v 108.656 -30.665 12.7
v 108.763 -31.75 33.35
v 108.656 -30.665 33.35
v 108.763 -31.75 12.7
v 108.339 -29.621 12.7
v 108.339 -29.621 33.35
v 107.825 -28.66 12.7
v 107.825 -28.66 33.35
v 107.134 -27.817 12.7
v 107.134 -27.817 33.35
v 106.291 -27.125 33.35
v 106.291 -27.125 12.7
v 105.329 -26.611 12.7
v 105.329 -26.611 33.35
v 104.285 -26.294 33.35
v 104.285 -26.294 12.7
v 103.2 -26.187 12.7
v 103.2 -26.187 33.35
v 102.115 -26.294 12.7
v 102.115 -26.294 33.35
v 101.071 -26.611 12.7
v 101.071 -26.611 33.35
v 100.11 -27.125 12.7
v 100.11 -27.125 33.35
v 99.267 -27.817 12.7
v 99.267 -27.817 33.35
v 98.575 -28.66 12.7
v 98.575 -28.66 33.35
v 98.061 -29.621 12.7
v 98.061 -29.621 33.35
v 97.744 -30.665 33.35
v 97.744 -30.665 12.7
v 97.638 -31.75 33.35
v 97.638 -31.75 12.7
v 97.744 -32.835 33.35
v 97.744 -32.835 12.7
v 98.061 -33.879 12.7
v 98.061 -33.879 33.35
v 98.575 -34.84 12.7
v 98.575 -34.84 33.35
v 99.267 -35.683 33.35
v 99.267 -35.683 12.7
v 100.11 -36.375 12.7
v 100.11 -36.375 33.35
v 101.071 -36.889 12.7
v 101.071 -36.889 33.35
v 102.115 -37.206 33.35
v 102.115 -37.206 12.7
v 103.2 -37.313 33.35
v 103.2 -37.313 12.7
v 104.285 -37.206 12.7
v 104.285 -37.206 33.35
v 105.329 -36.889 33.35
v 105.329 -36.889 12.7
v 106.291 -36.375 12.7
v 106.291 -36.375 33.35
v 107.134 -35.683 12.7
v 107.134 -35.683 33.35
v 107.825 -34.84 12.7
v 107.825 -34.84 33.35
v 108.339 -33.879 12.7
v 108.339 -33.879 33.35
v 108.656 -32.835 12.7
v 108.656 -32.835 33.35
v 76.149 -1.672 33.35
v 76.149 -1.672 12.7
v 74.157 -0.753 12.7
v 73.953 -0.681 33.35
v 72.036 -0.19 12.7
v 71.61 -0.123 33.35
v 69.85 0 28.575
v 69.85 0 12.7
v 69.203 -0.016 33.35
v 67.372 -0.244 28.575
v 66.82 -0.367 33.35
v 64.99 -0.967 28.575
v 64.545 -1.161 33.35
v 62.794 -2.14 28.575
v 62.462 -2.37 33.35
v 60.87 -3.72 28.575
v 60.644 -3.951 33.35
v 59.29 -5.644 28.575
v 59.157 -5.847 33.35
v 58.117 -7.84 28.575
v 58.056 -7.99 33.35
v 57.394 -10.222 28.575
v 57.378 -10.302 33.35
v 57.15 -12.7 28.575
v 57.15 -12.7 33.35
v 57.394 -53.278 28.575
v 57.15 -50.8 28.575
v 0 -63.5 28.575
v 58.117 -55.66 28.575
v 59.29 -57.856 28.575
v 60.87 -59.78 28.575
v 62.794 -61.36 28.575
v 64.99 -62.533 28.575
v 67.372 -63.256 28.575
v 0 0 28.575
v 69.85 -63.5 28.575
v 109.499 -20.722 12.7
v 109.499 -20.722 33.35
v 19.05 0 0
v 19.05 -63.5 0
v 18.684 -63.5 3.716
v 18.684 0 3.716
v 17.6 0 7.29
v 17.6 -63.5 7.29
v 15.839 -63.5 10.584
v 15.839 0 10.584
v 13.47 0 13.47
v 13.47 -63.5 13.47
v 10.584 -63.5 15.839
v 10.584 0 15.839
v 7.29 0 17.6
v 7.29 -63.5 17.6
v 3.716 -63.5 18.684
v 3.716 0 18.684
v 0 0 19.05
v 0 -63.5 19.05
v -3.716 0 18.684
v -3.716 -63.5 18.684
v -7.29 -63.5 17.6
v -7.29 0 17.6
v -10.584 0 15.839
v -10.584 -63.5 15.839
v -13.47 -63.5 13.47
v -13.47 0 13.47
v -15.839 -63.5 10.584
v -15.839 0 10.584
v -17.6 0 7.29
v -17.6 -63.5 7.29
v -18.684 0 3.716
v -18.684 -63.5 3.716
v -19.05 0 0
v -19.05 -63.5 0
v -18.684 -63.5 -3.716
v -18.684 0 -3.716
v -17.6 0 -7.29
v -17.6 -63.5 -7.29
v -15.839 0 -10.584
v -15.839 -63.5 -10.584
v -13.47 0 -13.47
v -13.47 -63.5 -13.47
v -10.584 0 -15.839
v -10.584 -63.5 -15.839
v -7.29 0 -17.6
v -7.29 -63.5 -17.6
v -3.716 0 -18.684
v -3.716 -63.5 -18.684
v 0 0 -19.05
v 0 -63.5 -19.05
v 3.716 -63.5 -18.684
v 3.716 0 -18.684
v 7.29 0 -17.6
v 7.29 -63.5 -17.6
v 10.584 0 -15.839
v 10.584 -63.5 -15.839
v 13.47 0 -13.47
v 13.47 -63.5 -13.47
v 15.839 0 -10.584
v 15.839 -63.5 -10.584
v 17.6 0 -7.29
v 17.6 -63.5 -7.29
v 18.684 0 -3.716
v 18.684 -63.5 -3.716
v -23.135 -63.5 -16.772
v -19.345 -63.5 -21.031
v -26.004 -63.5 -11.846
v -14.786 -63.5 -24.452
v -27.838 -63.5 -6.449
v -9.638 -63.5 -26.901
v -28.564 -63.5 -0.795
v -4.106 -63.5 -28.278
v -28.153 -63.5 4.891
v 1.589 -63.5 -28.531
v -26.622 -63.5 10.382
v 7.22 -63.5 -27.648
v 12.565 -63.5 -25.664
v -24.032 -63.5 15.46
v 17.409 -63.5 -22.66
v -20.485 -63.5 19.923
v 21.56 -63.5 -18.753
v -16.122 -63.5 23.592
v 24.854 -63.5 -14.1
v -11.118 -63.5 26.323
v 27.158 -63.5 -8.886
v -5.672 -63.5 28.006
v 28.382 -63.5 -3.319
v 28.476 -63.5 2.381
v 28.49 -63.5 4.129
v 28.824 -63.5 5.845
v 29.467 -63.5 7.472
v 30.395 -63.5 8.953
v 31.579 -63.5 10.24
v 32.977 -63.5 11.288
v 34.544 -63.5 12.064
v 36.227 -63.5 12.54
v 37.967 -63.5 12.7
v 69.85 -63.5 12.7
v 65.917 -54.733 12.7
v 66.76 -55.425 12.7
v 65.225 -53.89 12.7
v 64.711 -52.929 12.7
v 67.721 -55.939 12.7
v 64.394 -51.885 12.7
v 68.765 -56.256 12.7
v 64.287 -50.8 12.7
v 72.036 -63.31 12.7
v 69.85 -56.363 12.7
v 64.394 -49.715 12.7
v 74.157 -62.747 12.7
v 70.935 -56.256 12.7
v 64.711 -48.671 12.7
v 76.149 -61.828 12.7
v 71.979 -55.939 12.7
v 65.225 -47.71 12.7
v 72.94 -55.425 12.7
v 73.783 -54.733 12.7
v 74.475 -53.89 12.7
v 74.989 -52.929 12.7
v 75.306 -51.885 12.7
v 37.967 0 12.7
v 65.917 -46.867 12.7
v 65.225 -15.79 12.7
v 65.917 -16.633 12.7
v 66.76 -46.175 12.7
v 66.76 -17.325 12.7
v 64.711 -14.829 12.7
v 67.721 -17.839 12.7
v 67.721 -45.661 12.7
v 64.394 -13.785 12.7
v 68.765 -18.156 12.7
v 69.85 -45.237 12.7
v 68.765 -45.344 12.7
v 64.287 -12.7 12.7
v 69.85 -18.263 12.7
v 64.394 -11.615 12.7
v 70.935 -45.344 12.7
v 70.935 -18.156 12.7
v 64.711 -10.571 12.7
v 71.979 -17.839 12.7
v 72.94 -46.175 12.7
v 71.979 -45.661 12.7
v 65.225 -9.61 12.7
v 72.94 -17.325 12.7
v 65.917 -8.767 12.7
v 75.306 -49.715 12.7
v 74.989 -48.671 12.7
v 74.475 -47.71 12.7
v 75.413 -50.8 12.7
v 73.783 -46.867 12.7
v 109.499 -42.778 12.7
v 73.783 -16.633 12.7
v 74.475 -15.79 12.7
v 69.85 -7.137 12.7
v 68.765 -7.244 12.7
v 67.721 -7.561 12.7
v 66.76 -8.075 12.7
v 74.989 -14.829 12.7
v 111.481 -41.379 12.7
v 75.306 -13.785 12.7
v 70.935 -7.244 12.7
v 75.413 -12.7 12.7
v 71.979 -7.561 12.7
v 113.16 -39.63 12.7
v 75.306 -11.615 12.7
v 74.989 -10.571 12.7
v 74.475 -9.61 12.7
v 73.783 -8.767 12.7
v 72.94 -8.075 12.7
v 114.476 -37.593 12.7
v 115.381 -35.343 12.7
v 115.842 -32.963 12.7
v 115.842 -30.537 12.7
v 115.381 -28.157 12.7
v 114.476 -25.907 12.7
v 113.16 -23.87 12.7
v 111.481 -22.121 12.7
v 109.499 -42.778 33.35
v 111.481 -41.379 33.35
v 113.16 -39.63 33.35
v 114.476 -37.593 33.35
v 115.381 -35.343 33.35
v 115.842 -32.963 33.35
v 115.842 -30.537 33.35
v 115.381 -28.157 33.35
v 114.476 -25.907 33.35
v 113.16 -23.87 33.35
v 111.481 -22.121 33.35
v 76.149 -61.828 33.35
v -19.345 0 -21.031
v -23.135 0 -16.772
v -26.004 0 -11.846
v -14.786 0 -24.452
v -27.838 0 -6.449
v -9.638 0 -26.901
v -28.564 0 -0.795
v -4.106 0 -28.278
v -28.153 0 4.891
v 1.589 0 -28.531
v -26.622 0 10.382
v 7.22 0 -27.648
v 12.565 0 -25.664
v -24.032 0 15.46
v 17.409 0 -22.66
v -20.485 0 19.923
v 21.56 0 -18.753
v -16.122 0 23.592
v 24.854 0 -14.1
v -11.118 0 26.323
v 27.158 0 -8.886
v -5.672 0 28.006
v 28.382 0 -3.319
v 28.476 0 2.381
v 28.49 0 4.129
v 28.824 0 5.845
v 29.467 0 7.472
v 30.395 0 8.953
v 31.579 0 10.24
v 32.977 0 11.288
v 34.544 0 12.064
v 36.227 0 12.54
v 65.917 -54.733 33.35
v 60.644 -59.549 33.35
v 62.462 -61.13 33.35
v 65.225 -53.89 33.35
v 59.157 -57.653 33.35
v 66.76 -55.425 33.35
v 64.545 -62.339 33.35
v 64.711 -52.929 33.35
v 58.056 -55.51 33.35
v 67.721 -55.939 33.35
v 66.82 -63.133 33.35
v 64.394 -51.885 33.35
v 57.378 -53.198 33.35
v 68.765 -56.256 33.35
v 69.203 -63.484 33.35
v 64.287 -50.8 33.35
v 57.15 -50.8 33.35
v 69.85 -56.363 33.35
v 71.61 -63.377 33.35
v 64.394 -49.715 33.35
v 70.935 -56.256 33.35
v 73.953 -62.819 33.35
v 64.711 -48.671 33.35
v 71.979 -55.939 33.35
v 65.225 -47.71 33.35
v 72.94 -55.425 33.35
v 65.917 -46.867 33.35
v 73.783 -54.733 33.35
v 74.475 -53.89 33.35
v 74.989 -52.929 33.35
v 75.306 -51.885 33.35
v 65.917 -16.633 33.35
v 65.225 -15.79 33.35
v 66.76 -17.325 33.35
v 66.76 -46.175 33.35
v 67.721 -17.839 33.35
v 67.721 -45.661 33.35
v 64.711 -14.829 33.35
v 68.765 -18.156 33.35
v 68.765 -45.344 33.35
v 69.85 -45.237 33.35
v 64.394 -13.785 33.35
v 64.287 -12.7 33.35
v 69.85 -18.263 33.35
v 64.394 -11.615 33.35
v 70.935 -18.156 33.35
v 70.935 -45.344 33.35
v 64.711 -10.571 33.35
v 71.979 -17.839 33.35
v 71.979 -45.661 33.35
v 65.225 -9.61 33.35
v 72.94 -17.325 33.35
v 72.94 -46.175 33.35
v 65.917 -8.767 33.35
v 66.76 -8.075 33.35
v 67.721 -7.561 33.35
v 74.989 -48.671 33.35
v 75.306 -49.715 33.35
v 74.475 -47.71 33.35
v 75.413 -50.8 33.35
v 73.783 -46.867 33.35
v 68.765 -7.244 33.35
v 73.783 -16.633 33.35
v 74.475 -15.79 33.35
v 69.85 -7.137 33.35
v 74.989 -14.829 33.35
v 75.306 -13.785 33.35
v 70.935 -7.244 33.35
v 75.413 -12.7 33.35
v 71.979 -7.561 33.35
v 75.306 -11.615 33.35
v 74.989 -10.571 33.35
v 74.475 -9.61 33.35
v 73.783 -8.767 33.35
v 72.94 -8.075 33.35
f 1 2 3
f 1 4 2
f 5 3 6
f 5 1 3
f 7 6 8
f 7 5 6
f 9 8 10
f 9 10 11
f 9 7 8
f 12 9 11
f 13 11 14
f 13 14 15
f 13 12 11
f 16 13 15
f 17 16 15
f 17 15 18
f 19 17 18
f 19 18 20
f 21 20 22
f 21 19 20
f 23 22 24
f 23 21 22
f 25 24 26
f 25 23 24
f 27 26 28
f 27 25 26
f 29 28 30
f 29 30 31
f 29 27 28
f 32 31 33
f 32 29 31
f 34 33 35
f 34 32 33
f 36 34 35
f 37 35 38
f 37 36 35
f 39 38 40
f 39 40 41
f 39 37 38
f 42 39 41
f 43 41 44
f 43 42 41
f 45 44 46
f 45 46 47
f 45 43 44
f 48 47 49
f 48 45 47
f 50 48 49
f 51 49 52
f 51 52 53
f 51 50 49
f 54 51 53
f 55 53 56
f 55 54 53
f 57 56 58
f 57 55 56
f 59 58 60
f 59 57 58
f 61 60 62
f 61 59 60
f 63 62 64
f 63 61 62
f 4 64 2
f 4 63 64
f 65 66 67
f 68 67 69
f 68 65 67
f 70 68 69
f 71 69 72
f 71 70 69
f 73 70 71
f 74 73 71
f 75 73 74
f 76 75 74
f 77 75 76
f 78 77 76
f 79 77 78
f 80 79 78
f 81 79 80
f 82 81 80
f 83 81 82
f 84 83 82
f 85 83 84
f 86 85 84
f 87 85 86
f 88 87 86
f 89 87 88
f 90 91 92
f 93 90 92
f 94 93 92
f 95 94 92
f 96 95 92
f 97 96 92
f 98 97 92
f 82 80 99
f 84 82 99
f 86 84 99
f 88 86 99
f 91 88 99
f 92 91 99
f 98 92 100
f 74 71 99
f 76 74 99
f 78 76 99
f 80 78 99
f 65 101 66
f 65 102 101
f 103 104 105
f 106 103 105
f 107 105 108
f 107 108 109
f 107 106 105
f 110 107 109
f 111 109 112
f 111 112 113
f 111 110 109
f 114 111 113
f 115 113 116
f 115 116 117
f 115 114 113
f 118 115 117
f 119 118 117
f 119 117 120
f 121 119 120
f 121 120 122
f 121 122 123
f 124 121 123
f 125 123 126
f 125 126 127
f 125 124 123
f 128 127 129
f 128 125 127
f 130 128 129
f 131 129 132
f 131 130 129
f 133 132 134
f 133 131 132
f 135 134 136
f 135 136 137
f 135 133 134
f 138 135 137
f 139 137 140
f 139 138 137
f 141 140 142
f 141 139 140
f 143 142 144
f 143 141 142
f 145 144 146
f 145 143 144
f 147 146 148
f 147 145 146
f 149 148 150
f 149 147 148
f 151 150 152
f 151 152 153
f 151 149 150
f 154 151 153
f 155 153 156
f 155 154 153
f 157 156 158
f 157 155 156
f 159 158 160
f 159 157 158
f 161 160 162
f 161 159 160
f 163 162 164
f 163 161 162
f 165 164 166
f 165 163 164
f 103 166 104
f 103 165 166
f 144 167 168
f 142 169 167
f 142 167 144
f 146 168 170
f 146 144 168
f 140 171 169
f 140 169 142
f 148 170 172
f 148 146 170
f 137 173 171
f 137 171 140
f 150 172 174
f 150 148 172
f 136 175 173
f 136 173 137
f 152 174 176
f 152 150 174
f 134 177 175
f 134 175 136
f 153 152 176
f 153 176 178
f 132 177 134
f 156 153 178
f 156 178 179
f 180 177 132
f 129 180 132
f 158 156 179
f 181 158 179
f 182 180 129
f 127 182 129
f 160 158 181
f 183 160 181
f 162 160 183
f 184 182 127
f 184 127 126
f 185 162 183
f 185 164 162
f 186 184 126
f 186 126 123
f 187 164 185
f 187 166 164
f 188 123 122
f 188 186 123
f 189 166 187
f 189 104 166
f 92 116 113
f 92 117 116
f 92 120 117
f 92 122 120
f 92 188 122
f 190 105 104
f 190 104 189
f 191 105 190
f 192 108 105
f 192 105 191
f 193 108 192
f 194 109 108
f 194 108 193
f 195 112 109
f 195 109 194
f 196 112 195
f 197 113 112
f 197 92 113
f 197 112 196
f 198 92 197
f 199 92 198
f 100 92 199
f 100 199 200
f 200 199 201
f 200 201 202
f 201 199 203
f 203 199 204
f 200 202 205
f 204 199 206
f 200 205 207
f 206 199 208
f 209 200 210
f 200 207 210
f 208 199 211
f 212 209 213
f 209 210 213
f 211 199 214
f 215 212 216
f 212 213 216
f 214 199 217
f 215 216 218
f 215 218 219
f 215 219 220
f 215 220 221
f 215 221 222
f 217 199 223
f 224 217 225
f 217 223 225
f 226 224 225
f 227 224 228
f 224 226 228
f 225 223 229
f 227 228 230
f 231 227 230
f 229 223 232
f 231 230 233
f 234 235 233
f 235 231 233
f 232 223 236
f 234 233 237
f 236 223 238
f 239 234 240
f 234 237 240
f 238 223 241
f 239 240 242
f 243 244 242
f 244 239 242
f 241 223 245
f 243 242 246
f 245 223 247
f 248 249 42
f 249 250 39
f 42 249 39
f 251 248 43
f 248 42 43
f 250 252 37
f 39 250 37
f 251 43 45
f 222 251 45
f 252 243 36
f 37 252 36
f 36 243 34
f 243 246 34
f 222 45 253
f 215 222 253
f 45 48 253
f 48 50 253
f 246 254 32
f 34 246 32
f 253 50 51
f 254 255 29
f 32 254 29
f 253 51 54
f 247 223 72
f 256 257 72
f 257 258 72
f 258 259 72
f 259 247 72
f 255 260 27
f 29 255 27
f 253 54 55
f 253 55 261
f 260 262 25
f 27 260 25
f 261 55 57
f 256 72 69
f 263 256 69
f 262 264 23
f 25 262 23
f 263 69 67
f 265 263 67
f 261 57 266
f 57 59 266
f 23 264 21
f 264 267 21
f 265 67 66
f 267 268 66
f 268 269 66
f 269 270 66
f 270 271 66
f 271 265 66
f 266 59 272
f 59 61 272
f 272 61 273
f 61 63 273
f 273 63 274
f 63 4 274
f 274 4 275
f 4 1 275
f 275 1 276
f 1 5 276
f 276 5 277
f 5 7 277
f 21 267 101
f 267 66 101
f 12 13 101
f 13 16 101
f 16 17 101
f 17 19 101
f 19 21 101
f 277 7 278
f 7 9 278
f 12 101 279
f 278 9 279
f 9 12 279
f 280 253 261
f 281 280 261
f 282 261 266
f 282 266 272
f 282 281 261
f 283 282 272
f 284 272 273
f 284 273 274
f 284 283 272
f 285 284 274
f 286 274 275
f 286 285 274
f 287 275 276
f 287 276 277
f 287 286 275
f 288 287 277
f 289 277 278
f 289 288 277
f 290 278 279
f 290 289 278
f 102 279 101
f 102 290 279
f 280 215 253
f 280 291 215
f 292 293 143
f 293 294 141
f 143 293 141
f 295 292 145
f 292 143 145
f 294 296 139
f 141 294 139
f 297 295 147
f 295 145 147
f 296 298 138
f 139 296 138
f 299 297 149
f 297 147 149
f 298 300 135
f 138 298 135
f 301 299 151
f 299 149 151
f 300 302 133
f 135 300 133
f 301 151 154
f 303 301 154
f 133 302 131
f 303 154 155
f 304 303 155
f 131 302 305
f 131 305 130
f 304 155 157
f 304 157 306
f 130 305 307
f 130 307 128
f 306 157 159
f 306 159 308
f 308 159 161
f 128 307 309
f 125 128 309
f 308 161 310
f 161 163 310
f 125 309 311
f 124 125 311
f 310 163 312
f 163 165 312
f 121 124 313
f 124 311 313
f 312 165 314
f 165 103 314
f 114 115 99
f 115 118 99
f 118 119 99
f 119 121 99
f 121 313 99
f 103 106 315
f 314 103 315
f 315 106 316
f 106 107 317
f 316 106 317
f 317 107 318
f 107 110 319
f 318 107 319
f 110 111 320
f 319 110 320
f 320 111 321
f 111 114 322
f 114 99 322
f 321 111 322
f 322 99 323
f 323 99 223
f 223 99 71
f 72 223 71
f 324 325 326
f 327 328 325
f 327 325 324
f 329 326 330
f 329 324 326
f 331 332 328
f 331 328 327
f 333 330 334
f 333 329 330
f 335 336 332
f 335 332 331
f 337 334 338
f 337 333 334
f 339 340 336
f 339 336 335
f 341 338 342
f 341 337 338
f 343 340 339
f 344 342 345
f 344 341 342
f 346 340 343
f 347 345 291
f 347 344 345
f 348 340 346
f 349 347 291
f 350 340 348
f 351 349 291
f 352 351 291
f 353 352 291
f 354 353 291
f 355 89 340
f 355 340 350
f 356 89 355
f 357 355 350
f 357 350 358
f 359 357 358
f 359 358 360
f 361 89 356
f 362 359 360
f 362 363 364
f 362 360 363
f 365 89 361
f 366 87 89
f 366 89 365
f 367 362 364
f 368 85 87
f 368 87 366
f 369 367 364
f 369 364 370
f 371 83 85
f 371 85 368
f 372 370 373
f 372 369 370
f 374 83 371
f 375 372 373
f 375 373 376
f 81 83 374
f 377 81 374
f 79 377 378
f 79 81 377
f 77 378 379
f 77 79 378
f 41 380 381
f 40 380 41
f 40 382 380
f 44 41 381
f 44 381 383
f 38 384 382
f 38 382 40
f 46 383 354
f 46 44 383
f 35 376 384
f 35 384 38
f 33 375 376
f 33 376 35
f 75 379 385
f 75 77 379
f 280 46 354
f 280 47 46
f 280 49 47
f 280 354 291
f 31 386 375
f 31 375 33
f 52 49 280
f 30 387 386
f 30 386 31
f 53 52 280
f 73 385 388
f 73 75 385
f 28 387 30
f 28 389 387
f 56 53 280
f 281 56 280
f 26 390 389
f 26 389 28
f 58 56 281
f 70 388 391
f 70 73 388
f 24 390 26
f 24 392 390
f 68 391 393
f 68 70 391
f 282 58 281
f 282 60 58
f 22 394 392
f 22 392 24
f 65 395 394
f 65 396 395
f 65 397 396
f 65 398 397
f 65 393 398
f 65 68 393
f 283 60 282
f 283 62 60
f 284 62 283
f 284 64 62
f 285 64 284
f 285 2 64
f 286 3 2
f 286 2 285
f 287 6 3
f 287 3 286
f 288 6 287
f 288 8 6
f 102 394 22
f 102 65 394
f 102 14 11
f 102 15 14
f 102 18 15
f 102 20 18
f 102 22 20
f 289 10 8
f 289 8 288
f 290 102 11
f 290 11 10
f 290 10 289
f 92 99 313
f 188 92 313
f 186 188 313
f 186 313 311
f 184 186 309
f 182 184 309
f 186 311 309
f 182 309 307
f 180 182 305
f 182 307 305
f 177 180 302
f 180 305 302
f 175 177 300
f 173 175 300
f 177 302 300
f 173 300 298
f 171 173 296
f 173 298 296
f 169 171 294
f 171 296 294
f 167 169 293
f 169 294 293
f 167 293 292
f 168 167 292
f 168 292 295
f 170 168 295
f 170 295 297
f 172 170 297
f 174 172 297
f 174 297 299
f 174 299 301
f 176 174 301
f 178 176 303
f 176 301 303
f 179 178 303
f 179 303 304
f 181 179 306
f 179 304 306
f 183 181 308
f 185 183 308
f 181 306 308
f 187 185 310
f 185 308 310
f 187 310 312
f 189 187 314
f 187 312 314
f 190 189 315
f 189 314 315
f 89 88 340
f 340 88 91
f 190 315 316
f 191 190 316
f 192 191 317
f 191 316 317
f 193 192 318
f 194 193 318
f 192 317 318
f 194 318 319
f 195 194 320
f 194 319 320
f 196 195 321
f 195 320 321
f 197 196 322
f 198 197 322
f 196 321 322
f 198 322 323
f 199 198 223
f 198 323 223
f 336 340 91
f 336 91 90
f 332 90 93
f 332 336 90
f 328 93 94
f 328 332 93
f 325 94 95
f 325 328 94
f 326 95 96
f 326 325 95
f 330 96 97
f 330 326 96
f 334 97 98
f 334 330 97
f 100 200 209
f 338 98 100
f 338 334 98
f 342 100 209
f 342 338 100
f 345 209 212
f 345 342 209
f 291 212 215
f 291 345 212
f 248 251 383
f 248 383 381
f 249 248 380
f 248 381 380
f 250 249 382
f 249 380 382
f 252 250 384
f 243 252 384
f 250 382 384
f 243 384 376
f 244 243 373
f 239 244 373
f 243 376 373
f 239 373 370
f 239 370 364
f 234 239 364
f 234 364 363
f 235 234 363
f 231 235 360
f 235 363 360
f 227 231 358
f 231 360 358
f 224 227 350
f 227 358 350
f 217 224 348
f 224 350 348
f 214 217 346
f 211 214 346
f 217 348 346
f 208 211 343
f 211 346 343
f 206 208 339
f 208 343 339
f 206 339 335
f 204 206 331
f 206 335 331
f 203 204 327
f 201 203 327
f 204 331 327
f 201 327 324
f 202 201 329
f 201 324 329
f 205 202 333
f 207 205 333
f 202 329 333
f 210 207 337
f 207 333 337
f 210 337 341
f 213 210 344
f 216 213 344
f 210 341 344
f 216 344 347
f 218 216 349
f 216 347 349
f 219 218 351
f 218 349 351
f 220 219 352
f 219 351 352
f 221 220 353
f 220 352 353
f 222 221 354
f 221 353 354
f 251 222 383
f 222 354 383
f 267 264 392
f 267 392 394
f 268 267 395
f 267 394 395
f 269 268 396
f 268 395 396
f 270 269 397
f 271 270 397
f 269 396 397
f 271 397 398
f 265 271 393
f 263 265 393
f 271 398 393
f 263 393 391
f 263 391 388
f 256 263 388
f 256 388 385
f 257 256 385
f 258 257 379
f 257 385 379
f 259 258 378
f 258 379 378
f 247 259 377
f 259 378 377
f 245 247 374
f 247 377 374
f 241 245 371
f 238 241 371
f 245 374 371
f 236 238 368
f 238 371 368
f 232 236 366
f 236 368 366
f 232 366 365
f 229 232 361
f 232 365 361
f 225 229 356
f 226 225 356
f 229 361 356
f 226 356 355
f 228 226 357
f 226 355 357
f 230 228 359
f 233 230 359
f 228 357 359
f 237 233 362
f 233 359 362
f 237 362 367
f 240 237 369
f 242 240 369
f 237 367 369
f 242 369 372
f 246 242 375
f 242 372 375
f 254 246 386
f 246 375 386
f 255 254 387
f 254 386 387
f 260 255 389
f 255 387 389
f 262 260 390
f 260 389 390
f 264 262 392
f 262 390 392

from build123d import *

# Parameters (mm, degrees)
F0_R          = 19.05
F1_DEPTH      = 63.5
F2_R          = 5.5626
F3_DEPTH      = 4.7752
F3_DEPTH_BACK = 15.875
F5_DEPTH      = 57.151


with BuildPart() as f1:
    # F0 (on Front) → F1 (new body)
    with BuildSketch(Plane.XZ):
        with BuildLine():
            Line((69.85, 28.575), (0, 28.575))
            ThreePointArc((0, 28.575), (-19.345366, -21.030631), (28.475608, 2.38125))
            ThreePointArc((28.475608, 2.38125), (30.957268, 9.623455), (37.967478, 12.7))
            Line((37.967478, 12.7), (69.85, 12.7))
            Line((69.85, 12.7), (69.85, 28.575))
        make_face()
        Circle(F0_R, mode=Mode.SUBTRACT)
    extrude(amount=F1_DEPTH)

    # F2 (on face) → F3 (join, two sides)
    with BuildSketch(Plane.XY.offset(28.575)) as f3_sk:
        with BuildLine():
            ThreePointArc((76.149155, -1.672279), (63.474628, -1.716165), (57.15, -12.7))
            Line((57.15, -12.7), (57.15, -50.8))
            ThreePointArc((57.15, -50.8), (63.474628, -61.783835), (76.149155, -61.827721))
            Line((76.149155, -61.827721), (109.499355, -42.777721))
            ThreePointArc((109.499355, -42.777721), (115.9002, -31.75), (109.499355, -20.722279))
            Line((109.499355, -20.722279), (76.149155, -1.672279))
        make_face()
        with Locations((69.85, -50.8)):
            Circle(F2_R, mode=Mode.SUBTRACT)
        with Locations((69.85, -12.7)):
            Circle(F2_R, mode=Mode.SUBTRACT)
        with Locations((103.2002, -31.75)):
            Circle(F2_R, mode=Mode.SUBTRACT)
    extrude(amount=F3_DEPTH)
    extrude(f3_sk.sketch, amount=-F3_DEPTH_BACK)

    # F4 (on face) → F5 (cut, through all)
    with BuildSketch(Plane.XY.offset(28.575)):
        with BuildLine():
            Line((69.85, -18.2626), (69.85, -7.1374))
            ThreePointArc((69.85, -7.1374), (64.2874, -12.7), (69.85, -18.2626))
        make_face()
        with BuildLine():
            Line((69.85, -56.3626), (69.85, -45.2374))
            ThreePointArc((69.85, -45.2374), (64.2874, -50.8), (69.85, -56.3626))
        make_face()
    extrude(amount=-F5_DEPTH, mode=Mode.SUBTRACT)


solid = f1.part
